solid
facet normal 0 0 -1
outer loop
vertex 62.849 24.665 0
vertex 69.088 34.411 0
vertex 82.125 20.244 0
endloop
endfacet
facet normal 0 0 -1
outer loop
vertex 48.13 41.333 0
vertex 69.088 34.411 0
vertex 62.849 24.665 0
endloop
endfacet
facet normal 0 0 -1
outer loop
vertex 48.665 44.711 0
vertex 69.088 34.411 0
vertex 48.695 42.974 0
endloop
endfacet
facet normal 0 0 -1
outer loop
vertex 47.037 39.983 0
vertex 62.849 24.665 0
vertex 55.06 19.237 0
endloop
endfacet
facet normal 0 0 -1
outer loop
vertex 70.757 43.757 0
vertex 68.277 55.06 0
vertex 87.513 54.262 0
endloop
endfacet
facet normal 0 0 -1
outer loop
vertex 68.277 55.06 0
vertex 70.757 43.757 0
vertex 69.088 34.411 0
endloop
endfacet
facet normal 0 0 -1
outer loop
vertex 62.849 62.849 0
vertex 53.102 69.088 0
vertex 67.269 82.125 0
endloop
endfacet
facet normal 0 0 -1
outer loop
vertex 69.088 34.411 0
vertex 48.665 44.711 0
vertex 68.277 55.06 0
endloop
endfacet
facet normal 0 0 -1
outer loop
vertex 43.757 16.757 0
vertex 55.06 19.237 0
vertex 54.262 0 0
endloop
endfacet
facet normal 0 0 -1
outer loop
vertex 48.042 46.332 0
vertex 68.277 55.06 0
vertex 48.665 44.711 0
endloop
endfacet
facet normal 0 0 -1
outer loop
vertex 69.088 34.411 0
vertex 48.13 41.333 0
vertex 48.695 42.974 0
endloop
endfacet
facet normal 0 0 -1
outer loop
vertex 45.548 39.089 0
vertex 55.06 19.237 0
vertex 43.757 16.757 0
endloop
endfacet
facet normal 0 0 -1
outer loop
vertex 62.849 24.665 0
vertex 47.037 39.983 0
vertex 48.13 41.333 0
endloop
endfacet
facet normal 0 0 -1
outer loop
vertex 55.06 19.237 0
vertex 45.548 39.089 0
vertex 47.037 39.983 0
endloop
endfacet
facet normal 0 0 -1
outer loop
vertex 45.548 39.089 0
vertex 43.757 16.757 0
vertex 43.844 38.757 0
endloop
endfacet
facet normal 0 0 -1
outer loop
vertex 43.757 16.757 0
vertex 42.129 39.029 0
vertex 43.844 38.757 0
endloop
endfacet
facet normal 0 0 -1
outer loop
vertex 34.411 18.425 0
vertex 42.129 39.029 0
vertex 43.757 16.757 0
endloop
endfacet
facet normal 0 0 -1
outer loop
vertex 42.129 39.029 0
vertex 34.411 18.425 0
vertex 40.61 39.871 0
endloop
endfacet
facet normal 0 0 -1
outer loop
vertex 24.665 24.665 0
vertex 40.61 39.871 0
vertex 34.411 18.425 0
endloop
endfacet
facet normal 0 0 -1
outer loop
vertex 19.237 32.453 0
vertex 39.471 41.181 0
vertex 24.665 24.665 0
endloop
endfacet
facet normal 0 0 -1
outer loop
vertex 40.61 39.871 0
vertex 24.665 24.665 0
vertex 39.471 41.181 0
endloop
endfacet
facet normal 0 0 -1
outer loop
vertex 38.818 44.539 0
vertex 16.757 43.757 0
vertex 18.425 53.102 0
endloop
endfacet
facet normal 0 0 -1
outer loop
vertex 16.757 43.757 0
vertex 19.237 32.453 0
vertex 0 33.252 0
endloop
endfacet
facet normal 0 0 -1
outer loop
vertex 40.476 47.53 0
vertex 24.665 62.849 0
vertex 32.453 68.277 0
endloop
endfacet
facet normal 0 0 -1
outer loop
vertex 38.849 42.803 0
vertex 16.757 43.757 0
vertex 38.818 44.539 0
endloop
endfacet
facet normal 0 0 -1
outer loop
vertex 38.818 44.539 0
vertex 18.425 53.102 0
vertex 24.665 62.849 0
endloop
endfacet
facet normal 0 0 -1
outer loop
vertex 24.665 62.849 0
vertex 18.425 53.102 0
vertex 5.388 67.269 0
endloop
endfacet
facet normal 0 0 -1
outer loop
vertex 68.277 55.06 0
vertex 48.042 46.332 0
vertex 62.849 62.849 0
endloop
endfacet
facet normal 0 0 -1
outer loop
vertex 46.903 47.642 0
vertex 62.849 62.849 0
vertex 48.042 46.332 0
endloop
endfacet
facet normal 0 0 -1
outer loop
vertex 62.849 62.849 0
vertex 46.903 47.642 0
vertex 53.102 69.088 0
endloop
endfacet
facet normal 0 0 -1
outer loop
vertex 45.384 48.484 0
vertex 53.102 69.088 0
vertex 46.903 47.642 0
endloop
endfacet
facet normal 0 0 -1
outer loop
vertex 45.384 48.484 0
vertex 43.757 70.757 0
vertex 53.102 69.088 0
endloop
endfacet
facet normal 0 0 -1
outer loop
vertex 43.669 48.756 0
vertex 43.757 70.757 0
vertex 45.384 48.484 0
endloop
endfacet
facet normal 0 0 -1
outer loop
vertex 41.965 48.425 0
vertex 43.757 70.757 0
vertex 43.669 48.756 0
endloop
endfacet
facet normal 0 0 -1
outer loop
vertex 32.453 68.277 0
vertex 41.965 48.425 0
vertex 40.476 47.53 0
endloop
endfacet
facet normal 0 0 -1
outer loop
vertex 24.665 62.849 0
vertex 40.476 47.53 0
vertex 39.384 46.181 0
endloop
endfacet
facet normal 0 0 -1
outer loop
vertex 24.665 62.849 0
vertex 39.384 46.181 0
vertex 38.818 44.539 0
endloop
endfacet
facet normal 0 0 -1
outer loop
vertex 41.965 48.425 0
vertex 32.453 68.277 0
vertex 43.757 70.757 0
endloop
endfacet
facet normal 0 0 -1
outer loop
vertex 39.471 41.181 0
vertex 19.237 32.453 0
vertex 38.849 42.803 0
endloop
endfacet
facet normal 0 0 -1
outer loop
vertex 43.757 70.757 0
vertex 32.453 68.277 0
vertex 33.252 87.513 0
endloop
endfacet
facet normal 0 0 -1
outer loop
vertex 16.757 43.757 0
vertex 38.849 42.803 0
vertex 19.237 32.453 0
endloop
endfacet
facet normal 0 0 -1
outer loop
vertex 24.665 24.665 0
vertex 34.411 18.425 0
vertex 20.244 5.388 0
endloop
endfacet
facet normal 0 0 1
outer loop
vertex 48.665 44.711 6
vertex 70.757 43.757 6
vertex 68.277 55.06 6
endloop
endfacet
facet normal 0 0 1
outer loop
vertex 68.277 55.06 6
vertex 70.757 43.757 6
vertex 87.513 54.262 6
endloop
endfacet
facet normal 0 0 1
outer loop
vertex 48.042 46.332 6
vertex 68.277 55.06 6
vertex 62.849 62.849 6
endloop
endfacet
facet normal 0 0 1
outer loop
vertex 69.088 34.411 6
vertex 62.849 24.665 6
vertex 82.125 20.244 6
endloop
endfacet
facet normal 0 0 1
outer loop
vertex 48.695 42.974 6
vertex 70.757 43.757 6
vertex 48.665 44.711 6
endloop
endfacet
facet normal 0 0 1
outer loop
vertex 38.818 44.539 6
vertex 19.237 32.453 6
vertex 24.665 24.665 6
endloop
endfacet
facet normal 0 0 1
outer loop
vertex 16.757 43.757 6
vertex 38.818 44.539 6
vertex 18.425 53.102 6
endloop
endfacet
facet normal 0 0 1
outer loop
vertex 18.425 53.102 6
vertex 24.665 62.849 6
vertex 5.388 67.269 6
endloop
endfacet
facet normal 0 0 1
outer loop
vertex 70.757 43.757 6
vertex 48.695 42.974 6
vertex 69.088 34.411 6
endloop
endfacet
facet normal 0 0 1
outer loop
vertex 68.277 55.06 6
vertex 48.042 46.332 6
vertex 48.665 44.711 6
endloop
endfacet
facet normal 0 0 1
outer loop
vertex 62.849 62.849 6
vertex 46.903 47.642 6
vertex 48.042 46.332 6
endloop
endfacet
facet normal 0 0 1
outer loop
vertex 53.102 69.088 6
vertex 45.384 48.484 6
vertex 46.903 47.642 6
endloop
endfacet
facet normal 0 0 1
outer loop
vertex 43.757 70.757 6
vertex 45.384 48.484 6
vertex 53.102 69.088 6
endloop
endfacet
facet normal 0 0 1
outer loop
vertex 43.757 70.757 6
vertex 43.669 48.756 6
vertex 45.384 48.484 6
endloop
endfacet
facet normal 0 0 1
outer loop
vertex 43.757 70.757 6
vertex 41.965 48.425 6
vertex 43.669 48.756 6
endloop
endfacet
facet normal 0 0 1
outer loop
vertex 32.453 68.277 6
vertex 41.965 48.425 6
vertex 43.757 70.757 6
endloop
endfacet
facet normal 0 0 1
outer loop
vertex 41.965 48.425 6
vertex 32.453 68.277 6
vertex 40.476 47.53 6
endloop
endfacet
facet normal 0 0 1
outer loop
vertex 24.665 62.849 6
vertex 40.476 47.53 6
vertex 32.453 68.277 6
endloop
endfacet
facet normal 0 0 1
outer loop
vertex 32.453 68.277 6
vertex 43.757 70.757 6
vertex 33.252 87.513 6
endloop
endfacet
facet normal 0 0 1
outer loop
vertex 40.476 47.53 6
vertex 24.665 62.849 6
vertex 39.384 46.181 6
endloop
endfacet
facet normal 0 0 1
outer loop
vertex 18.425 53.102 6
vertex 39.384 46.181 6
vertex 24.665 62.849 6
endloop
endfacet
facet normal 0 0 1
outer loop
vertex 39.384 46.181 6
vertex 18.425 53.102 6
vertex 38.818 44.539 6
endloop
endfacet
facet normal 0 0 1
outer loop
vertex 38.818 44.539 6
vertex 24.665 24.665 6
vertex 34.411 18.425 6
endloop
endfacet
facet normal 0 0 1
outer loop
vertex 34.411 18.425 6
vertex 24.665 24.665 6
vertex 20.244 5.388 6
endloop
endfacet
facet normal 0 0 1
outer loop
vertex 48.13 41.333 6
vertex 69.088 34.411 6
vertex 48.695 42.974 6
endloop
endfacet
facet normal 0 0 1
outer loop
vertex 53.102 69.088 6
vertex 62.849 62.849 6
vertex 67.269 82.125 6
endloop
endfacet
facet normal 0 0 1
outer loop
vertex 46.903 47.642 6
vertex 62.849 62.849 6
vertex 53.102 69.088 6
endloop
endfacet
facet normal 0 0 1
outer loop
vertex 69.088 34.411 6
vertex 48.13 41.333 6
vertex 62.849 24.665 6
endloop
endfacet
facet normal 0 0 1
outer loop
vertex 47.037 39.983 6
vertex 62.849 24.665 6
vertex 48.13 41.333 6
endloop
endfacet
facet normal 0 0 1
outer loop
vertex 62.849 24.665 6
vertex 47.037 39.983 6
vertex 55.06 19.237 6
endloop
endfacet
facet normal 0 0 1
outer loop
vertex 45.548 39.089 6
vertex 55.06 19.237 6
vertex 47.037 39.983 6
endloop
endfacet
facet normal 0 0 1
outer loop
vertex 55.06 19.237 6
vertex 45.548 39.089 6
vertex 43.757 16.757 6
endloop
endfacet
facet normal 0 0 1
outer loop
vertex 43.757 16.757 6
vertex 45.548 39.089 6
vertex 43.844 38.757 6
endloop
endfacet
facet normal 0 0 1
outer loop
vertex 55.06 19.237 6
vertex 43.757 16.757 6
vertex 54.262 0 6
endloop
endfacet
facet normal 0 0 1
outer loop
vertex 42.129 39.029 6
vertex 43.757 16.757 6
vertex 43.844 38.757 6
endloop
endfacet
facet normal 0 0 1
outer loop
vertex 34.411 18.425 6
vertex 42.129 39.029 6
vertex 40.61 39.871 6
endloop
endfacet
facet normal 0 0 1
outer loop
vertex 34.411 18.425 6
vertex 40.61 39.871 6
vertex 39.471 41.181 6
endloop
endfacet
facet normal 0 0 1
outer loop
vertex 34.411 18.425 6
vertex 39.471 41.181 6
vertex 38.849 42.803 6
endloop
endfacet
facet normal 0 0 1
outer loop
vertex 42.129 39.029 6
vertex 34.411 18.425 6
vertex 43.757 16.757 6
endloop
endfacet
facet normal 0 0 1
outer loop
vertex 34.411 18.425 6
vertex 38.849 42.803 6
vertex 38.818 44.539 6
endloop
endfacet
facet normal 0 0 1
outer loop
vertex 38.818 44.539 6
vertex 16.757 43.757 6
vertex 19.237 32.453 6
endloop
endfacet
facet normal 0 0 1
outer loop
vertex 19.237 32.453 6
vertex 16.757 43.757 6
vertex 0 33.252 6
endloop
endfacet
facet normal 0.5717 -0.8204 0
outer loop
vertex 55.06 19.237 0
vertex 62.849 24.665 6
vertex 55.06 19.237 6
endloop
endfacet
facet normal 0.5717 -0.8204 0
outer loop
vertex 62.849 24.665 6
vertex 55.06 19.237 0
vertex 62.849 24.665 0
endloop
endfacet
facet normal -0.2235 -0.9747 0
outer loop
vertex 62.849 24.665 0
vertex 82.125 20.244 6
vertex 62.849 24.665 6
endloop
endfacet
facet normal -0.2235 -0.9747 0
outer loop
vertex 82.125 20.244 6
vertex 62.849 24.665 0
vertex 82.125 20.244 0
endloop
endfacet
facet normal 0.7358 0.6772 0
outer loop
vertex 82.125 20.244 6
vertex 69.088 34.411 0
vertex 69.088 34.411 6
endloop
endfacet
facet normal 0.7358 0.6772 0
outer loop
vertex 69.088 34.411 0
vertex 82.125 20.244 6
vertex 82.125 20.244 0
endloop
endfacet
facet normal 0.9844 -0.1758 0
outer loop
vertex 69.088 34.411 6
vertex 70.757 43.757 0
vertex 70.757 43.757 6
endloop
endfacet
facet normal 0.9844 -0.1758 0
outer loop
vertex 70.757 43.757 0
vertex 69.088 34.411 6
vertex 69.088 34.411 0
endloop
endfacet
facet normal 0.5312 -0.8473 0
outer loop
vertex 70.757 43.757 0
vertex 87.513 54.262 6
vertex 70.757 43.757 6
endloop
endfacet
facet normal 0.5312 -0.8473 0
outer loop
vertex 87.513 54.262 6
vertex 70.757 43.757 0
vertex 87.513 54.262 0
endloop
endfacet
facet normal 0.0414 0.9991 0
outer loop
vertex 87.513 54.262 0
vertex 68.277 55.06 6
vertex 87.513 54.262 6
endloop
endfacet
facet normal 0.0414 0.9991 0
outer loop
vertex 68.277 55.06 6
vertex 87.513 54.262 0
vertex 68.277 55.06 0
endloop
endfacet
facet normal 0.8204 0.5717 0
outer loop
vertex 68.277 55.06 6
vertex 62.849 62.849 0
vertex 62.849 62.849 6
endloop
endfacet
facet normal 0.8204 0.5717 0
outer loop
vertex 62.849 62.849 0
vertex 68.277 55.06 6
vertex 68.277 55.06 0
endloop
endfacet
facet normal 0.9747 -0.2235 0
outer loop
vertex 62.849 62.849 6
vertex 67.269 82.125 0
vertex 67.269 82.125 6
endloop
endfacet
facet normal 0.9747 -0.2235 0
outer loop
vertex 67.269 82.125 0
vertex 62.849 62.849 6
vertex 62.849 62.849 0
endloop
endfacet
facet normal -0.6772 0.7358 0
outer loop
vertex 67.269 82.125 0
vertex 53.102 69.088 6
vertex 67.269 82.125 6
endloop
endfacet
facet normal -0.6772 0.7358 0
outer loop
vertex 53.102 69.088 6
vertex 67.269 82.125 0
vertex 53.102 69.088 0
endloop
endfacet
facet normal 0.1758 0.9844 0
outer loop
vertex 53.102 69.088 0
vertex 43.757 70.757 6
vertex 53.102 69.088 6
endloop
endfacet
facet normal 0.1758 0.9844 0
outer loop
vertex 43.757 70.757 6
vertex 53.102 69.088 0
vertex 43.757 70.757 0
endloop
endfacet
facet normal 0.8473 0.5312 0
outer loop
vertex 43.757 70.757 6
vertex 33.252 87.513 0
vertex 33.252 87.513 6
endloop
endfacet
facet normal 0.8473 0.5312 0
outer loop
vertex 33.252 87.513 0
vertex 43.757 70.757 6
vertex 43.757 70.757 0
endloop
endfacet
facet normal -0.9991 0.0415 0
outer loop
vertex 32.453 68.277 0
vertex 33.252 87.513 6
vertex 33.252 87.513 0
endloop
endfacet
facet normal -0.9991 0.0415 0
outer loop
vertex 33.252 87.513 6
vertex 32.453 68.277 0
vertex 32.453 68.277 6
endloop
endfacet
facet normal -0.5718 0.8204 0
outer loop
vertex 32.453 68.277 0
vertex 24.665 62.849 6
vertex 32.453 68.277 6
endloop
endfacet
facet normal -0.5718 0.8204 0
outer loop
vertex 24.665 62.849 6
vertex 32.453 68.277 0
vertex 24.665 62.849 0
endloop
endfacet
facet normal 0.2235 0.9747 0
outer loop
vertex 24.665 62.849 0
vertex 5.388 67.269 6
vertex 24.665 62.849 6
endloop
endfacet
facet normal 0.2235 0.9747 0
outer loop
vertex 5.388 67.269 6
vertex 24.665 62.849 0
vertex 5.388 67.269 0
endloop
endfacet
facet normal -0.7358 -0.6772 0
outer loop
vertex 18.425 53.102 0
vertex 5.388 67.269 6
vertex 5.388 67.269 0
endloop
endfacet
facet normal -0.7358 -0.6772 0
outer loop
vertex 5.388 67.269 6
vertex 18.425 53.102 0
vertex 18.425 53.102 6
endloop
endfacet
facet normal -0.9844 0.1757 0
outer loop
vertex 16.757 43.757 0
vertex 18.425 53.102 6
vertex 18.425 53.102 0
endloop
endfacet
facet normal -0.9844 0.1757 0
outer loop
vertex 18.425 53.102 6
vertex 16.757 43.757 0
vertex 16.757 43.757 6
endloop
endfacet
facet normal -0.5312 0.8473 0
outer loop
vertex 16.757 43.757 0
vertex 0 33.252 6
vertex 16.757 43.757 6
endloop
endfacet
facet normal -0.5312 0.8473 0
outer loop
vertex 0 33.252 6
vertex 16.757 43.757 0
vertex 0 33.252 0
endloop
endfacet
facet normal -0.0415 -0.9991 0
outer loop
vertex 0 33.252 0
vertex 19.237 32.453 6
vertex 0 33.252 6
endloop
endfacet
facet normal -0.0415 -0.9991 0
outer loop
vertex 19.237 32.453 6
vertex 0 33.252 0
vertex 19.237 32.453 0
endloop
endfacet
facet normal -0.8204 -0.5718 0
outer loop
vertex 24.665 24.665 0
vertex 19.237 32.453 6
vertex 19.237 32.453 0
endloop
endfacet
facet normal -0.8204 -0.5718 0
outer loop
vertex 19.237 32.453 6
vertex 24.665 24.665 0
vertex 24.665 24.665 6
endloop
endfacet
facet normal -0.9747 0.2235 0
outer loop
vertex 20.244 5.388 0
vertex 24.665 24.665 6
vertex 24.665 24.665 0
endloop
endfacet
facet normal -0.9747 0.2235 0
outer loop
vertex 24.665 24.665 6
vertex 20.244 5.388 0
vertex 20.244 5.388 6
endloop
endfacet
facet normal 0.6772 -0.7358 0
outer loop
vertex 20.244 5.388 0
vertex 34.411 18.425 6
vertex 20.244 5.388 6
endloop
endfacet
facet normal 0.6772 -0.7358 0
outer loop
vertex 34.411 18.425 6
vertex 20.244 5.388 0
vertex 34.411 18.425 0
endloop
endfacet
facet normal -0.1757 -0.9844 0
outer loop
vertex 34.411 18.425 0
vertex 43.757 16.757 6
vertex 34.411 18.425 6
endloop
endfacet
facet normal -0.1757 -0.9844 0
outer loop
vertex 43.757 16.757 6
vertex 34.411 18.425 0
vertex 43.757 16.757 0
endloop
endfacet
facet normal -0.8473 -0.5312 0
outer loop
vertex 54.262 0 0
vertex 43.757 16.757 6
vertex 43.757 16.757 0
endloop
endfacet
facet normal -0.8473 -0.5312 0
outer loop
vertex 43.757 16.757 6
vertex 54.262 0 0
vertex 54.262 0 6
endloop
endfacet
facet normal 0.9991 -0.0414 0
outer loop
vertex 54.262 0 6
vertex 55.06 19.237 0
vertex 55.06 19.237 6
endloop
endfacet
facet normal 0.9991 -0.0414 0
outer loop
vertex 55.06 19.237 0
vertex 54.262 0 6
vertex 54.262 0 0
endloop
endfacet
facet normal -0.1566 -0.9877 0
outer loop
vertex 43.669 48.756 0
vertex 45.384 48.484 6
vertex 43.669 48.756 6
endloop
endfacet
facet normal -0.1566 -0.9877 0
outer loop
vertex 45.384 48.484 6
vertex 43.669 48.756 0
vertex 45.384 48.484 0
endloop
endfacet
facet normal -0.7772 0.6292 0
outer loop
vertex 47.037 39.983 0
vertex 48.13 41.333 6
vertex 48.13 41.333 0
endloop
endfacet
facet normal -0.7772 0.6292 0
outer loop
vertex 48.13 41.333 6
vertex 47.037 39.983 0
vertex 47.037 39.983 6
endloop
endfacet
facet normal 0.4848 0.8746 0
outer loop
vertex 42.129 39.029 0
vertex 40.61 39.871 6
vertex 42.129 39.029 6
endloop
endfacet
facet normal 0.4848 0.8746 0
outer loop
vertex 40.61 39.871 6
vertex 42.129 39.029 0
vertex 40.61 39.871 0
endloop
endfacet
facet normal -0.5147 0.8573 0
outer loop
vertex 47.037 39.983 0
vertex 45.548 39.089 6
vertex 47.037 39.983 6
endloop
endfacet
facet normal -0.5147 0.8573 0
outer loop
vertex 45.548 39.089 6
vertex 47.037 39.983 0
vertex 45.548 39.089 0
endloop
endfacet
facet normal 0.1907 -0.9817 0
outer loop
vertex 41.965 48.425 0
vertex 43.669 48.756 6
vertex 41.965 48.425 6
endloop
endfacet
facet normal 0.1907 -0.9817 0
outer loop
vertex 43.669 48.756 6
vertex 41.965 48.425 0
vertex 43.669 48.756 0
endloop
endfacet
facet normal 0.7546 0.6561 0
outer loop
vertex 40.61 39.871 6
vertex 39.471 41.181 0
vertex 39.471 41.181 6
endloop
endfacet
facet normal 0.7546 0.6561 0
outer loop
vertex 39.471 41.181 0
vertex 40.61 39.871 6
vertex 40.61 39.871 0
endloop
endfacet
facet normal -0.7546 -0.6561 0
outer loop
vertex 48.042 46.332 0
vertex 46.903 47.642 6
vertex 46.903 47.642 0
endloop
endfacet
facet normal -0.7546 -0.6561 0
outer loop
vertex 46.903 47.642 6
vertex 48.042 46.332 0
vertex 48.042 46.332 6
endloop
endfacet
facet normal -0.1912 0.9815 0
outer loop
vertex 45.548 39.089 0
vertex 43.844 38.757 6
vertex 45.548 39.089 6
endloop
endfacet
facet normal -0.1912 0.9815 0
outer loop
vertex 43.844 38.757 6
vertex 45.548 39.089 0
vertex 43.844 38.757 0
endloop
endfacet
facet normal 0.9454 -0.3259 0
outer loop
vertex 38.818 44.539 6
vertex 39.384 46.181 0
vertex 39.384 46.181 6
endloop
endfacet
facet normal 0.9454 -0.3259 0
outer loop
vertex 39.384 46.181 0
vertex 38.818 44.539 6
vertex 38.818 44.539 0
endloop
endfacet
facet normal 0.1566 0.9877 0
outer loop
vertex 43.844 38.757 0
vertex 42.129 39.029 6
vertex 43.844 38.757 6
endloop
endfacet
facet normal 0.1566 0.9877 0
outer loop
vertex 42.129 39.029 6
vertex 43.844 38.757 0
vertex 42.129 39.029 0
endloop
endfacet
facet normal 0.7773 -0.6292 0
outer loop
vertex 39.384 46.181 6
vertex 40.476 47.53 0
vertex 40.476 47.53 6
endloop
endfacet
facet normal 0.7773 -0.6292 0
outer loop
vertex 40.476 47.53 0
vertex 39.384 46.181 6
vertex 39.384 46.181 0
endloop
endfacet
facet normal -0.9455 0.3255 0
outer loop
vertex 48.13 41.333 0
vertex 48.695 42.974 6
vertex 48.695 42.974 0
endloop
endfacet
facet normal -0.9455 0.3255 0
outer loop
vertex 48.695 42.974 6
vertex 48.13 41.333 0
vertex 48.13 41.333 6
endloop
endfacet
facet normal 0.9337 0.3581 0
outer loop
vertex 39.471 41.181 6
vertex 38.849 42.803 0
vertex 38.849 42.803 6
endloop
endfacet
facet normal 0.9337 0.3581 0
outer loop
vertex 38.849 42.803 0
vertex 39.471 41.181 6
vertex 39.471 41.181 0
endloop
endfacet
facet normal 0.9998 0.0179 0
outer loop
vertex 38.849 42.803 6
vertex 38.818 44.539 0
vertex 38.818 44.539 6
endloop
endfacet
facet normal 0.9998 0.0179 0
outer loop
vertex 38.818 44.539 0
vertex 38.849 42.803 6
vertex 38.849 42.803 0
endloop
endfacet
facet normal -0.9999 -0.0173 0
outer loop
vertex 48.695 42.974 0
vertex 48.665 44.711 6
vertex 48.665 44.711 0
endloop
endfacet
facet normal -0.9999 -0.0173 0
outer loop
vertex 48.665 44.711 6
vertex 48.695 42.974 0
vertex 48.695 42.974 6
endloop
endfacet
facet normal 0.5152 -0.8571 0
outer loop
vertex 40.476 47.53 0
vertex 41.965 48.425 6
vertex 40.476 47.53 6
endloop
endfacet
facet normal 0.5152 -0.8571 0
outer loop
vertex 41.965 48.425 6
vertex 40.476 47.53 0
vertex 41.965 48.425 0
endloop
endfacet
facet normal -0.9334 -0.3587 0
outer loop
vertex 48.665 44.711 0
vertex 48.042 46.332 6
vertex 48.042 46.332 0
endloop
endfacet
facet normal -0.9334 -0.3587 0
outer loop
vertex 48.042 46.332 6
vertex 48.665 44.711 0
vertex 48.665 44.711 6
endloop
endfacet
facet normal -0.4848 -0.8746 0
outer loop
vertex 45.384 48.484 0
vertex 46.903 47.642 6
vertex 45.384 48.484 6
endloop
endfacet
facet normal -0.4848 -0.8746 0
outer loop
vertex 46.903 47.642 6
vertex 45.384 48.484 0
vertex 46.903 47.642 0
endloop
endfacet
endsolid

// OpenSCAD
$fn = 32;

// ----------------------------------------------------------------------
// Star wheel: 8-point ratchet, R45
// ----------------------------------------------------------------------

// --- parameters (mm) ---
n_points = 8;             // number of points / teeth
r_out = 45;               // tip radius
r_in = 27;                // root radius
bore_r = 5;               // centre bore radius
plate_t = 6;              // plate thickness, Z (extrusion height)
bore_d = 10;              // centre bore diameter

profile = [[43.757, 70.757], [33.252, 87.513], [32.453, 68.277], [24.665, 62.849], [5.388, 67.269], [18.425, 53.102], [16.757, 43.757], [0, 33.252], [19.237, 32.453], [24.665, 24.665], [20.244, 5.388], [34.411, 18.425], [43.757, 16.757], [54.262, 0], [55.06, 19.237], [62.849, 24.665], [82.125, 20.244], [69.088, 34.411], [70.757, 43.757], [87.513, 54.262], [68.277, 55.06], [62.849, 62.849], [67.269, 82.125], [53.102, 69.088]];  // primary outline, 24 points, counter clockwise
void_1 = [[48.665, 44.711], [48.042, 46.332], [46.903, 47.642], [45.384, 48.484], [43.669, 48.756], [41.965, 48.425], [40.476, 47.53], [39.384, 46.181], [38.818, 44.539], [38.849, 42.803], [39.471, 41.181], [40.61, 39.871], [42.129, 39.029], [43.844, 38.757], [45.548, 39.089], [47.037, 39.983], [48.13, 41.333], [48.695, 42.974]];  // centre bore, 18 points

// --- the one profile operation ---
difference() {
  linear_extrude(height = plate_t) polygon(points = profile);
  translate([0, 0, -1])
    linear_extrude(height = plate_t + 2) polygon(points = void_1);
}
